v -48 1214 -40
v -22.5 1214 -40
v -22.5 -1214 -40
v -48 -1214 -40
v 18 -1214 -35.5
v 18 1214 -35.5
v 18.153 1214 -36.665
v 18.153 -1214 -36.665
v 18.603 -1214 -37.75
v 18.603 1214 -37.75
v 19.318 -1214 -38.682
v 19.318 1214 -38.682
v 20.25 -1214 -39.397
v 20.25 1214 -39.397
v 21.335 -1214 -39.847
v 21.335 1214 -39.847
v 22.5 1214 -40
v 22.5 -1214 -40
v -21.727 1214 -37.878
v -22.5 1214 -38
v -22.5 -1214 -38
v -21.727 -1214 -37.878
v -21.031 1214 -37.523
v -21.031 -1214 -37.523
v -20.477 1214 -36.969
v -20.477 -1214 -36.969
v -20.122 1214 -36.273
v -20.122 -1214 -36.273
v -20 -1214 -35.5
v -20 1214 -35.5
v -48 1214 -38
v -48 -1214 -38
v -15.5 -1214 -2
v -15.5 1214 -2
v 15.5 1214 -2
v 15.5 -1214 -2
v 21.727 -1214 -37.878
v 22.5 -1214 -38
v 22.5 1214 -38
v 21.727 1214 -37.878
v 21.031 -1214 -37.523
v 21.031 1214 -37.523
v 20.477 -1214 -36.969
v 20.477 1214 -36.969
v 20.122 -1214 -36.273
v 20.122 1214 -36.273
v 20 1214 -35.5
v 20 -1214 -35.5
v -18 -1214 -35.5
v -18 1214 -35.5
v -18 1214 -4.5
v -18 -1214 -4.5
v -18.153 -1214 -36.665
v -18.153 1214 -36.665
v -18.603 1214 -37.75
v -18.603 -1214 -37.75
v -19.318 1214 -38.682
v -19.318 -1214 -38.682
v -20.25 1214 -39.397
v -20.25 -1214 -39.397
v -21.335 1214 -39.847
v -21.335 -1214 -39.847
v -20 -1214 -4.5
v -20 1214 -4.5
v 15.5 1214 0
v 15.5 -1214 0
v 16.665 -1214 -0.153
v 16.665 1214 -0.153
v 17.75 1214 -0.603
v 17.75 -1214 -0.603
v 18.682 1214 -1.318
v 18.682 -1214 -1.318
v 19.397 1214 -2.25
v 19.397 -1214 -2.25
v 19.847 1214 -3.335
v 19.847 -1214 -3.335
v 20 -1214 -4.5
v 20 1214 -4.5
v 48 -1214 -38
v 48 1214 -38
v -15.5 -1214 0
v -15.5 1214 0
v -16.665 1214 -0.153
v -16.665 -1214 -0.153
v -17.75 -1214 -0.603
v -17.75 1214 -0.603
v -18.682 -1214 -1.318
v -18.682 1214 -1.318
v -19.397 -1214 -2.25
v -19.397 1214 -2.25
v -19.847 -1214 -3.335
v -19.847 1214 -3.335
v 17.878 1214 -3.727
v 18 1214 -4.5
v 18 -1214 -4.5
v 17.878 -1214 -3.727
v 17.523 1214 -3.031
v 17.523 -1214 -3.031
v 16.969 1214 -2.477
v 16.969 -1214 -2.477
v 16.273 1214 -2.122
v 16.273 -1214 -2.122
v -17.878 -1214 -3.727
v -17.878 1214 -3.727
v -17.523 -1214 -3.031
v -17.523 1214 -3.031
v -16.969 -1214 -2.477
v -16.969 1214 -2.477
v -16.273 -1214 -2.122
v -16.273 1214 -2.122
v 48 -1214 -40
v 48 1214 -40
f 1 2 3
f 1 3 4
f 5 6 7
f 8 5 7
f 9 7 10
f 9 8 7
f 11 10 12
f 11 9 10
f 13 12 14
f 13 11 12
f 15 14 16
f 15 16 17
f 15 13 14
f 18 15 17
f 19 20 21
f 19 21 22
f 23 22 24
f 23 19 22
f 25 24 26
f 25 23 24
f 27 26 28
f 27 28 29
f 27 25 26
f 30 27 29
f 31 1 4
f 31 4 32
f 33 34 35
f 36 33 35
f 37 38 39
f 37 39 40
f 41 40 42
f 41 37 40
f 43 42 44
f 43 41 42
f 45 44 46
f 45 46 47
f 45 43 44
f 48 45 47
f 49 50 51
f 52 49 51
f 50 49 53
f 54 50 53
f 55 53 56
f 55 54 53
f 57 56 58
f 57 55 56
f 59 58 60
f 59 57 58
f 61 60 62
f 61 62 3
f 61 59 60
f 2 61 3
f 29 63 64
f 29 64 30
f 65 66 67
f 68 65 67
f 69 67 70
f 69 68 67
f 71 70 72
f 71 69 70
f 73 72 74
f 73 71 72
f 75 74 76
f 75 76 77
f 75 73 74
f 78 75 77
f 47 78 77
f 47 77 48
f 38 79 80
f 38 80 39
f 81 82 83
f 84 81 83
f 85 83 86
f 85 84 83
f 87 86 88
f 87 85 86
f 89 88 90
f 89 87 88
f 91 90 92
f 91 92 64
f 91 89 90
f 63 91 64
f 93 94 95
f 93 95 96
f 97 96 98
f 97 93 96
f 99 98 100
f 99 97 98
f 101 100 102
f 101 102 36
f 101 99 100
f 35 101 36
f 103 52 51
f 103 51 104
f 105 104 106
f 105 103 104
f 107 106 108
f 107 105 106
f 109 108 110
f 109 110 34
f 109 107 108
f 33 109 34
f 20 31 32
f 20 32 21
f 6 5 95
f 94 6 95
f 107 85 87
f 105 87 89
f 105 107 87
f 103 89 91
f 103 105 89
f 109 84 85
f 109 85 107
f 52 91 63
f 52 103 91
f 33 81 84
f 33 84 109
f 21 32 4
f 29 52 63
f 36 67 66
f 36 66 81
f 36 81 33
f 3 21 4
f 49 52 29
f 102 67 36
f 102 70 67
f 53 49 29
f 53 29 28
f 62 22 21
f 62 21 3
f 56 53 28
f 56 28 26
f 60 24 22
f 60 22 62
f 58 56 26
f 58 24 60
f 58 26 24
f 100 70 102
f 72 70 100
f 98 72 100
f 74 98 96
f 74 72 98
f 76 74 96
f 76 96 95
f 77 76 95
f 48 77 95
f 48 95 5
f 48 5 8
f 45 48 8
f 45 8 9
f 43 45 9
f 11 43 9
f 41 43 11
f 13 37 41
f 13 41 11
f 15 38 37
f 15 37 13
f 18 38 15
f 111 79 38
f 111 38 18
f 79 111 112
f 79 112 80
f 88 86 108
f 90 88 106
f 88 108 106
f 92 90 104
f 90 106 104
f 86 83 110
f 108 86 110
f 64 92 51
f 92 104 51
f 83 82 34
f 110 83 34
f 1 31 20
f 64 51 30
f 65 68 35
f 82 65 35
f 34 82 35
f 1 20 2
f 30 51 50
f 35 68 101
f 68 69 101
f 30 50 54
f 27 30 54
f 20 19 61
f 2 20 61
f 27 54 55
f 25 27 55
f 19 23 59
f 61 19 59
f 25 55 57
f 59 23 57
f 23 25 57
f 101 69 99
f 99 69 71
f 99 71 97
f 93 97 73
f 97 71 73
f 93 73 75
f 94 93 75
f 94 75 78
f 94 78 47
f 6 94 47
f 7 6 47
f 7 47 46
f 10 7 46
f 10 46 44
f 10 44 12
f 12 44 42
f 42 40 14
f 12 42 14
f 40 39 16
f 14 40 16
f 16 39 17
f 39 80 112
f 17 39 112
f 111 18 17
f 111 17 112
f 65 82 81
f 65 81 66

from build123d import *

# Parameters (mm, degrees)
SKETCH1_W                      = 40
SKETCH1_H                      = 2428
BASE_FLANGE1_DEPTH             = 2
EDGE_FLANGE1_STRIP_W           = 13
EDGE_FLANGE1_STRIP_H           = 2
EDGE_FLANGE1_STRIP_CUT_DEPTH   = 2428
EDGE_FLANGE1_STRIP_2_W         = 13
EDGE_FLANGE1_STRIP_2_H         = 2
EDGE_FLANGE1_STRIP_CUT_2_DEPTH = 2428
EDGE_FLANGE1_DEPTH             = 2428
EDGE_FLANGE1_BEND_DEPTH        = 2428
EDGE_FLANGE2_STRIP_W           = 13
EDGE_FLANGE2_STRIP_H           = 2
EDGE_FLANGE2_STRIP_CUT_DEPTH   = 2428
EDGE_FLANGE2_STRIP_2_W         = 13
EDGE_FLANGE2_STRIP_2_H         = 2
EDGE_FLANGE2_STRIP_CUT_2_DEPTH = 2428
EDGE_FLANGE2_DEPTH             = 2428
EDGE_FLANGE2_BEND_DEPTH        = 2428


# Sheet-metal steps are written as plain solids
with BuildPart() as part:
    # Sketch1 → Base-Flange1 (new body)
    with BuildSketch(Plane.XY):
        Rectangle(SKETCH1_W, SKETCH1_H)
    extrude(amount=-BASE_FLANGE1_DEPTH)

    # Edge-Flange1 strip (across the edge) → Edge-Flange1 strip cut (cut)
    with BuildSketch(Plane(origin=(20, 1214, -2), x_dir=(-1, 0, 0), z_dir=(0, -1, 0))):
        with Locations((-2, -1)):
            Rectangle(EDGE_FLANGE1_STRIP_W, EDGE_FLANGE1_STRIP_H)
    extrude(amount=EDGE_FLANGE1_STRIP_CUT_DEPTH, mode=Mode.SUBTRACT)

    # Edge-Flange1 strip 2 (across the edge) → Edge-Flange1 strip cut 2 (cut)
    with BuildSketch(Plane(origin=(-20, -1214, -2), x_dir=(1, 0, 0), z_dir=(0, 1, 0))):
        with Locations((-2, -1)):
            Rectangle(EDGE_FLANGE1_STRIP_2_W, EDGE_FLANGE1_STRIP_2_H)
    extrude(amount=EDGE_FLANGE1_STRIP_CUT_2_DEPTH, mode=Mode.SUBTRACT)

    # Edge-Flange1 section (across the edge) → Edge-Flange1 (add)
    with BuildSketch(Plane(origin=(20, 1214, -2), x_dir=(-1, 0, 0), z_dir=(0, -1, 0))):
        with BuildLine():
            Line((0, 2.5), (0, 38))
            Line((0, 38), (2, 38))
            Line((2, 38), (2, 2.5))
            ThreePointArc((2, 2.5), (2.732233047, 0.732233047), (4.5, 0))
            Line((4.5, 0), (4.5, -2))
            ThreePointArc((4.5, -2), (1.318019485, -0.681980515), (0, 2.5))
        make_face()
    extrude(amount=EDGE_FLANGE1_DEPTH)

    # Edge-Flange1 section 2 (across the edge) → Edge-Flange1 bend (add)
    with BuildSketch(Plane(origin=(-20, -1214, -2), x_dir=(1, 0, 0), z_dir=(0, 1, 0))):
        with BuildLine():
            Line((0, 2.5), (0, 38))
            Line((0, 38), (2, 38))
            Line((2, 38), (2, 2.5))
            ThreePointArc((2, 2.5), (2.732233047, 0.732233047), (4.5, 0))
            Line((4.5, 0), (4.5, -2))
            ThreePointArc((4.5, -2), (1.318019485, -0.681980515), (0, 2.5))
        make_face()
    extrude(amount=EDGE_FLANGE1_BEND_DEPTH)

    # Edge-Flange2 strip (across the edge) → Edge-Flange2 strip cut (cut)
    with BuildSketch(Plane(origin=(-20, 1214, -40), x_dir=(0, 0, 1), z_dir=(0, -1, 0))):
        with Locations((-2, -1)):
            Rectangle(EDGE_FLANGE2_STRIP_W, EDGE_FLANGE2_STRIP_H)
    extrude(amount=EDGE_FLANGE2_STRIP_CUT_DEPTH, mode=Mode.SUBTRACT)

    # Edge-Flange2 strip 2 (across the edge) → Edge-Flange2 strip cut 2 (cut)
    with BuildSketch(Plane(origin=(20, -1214, -40), x_dir=(0, 0, 1), z_dir=(0, 1, 0))):
        with Locations((-2, -1)):
            Rectangle(EDGE_FLANGE2_STRIP_2_W, EDGE_FLANGE2_STRIP_2_H)
    extrude(amount=EDGE_FLANGE2_STRIP_CUT_2_DEPTH, mode=Mode.SUBTRACT)

    # Edge-Flange2 section (across the edge) → Edge-Flange2 (add)
    with BuildSketch(Plane(origin=(-20, 1214, -40), x_dir=(0, 0, 1), z_dir=(0, -1, 0))):
        with BuildLine():
            Line((0, 2.5), (0, 28))
            Line((0, 28), (2, 28))
            Line((2, 28), (2, 2.5))
            ThreePointArc((2, 2.5), (2.732233047, 0.732233047), (4.5, 0))
            Line((4.5, 0), (4.5, -2))
            ThreePointArc((4.5, -2), (1.318019485, -0.681980515), (0, 2.5))
        make_face()
    extrude(amount=EDGE_FLANGE2_DEPTH)

    # Edge-Flange2 section 2 (across the edge) → Edge-Flange2 bend (add)
    with BuildSketch(Plane(origin=(20, -1214, -40), x_dir=(0, 0, 1), z_dir=(0, 1, 0))):
        with BuildLine():
            Line((0, 2.5), (0, 28))
            Line((0, 28), (2, 28))
            Line((2, 28), (2, 2.5))
            ThreePointArc((2, 2.5), (2.732233047, 0.732233047), (4.5, 0))
            Line((4.5, 0), (4.5, -2))
            ThreePointArc((4.5, -2), (1.318019485, -0.681980515), (0, 2.5))
        make_face()
    extrude(amount=EDGE_FLANGE2_BEND_DEPTH)


solid = part.part
